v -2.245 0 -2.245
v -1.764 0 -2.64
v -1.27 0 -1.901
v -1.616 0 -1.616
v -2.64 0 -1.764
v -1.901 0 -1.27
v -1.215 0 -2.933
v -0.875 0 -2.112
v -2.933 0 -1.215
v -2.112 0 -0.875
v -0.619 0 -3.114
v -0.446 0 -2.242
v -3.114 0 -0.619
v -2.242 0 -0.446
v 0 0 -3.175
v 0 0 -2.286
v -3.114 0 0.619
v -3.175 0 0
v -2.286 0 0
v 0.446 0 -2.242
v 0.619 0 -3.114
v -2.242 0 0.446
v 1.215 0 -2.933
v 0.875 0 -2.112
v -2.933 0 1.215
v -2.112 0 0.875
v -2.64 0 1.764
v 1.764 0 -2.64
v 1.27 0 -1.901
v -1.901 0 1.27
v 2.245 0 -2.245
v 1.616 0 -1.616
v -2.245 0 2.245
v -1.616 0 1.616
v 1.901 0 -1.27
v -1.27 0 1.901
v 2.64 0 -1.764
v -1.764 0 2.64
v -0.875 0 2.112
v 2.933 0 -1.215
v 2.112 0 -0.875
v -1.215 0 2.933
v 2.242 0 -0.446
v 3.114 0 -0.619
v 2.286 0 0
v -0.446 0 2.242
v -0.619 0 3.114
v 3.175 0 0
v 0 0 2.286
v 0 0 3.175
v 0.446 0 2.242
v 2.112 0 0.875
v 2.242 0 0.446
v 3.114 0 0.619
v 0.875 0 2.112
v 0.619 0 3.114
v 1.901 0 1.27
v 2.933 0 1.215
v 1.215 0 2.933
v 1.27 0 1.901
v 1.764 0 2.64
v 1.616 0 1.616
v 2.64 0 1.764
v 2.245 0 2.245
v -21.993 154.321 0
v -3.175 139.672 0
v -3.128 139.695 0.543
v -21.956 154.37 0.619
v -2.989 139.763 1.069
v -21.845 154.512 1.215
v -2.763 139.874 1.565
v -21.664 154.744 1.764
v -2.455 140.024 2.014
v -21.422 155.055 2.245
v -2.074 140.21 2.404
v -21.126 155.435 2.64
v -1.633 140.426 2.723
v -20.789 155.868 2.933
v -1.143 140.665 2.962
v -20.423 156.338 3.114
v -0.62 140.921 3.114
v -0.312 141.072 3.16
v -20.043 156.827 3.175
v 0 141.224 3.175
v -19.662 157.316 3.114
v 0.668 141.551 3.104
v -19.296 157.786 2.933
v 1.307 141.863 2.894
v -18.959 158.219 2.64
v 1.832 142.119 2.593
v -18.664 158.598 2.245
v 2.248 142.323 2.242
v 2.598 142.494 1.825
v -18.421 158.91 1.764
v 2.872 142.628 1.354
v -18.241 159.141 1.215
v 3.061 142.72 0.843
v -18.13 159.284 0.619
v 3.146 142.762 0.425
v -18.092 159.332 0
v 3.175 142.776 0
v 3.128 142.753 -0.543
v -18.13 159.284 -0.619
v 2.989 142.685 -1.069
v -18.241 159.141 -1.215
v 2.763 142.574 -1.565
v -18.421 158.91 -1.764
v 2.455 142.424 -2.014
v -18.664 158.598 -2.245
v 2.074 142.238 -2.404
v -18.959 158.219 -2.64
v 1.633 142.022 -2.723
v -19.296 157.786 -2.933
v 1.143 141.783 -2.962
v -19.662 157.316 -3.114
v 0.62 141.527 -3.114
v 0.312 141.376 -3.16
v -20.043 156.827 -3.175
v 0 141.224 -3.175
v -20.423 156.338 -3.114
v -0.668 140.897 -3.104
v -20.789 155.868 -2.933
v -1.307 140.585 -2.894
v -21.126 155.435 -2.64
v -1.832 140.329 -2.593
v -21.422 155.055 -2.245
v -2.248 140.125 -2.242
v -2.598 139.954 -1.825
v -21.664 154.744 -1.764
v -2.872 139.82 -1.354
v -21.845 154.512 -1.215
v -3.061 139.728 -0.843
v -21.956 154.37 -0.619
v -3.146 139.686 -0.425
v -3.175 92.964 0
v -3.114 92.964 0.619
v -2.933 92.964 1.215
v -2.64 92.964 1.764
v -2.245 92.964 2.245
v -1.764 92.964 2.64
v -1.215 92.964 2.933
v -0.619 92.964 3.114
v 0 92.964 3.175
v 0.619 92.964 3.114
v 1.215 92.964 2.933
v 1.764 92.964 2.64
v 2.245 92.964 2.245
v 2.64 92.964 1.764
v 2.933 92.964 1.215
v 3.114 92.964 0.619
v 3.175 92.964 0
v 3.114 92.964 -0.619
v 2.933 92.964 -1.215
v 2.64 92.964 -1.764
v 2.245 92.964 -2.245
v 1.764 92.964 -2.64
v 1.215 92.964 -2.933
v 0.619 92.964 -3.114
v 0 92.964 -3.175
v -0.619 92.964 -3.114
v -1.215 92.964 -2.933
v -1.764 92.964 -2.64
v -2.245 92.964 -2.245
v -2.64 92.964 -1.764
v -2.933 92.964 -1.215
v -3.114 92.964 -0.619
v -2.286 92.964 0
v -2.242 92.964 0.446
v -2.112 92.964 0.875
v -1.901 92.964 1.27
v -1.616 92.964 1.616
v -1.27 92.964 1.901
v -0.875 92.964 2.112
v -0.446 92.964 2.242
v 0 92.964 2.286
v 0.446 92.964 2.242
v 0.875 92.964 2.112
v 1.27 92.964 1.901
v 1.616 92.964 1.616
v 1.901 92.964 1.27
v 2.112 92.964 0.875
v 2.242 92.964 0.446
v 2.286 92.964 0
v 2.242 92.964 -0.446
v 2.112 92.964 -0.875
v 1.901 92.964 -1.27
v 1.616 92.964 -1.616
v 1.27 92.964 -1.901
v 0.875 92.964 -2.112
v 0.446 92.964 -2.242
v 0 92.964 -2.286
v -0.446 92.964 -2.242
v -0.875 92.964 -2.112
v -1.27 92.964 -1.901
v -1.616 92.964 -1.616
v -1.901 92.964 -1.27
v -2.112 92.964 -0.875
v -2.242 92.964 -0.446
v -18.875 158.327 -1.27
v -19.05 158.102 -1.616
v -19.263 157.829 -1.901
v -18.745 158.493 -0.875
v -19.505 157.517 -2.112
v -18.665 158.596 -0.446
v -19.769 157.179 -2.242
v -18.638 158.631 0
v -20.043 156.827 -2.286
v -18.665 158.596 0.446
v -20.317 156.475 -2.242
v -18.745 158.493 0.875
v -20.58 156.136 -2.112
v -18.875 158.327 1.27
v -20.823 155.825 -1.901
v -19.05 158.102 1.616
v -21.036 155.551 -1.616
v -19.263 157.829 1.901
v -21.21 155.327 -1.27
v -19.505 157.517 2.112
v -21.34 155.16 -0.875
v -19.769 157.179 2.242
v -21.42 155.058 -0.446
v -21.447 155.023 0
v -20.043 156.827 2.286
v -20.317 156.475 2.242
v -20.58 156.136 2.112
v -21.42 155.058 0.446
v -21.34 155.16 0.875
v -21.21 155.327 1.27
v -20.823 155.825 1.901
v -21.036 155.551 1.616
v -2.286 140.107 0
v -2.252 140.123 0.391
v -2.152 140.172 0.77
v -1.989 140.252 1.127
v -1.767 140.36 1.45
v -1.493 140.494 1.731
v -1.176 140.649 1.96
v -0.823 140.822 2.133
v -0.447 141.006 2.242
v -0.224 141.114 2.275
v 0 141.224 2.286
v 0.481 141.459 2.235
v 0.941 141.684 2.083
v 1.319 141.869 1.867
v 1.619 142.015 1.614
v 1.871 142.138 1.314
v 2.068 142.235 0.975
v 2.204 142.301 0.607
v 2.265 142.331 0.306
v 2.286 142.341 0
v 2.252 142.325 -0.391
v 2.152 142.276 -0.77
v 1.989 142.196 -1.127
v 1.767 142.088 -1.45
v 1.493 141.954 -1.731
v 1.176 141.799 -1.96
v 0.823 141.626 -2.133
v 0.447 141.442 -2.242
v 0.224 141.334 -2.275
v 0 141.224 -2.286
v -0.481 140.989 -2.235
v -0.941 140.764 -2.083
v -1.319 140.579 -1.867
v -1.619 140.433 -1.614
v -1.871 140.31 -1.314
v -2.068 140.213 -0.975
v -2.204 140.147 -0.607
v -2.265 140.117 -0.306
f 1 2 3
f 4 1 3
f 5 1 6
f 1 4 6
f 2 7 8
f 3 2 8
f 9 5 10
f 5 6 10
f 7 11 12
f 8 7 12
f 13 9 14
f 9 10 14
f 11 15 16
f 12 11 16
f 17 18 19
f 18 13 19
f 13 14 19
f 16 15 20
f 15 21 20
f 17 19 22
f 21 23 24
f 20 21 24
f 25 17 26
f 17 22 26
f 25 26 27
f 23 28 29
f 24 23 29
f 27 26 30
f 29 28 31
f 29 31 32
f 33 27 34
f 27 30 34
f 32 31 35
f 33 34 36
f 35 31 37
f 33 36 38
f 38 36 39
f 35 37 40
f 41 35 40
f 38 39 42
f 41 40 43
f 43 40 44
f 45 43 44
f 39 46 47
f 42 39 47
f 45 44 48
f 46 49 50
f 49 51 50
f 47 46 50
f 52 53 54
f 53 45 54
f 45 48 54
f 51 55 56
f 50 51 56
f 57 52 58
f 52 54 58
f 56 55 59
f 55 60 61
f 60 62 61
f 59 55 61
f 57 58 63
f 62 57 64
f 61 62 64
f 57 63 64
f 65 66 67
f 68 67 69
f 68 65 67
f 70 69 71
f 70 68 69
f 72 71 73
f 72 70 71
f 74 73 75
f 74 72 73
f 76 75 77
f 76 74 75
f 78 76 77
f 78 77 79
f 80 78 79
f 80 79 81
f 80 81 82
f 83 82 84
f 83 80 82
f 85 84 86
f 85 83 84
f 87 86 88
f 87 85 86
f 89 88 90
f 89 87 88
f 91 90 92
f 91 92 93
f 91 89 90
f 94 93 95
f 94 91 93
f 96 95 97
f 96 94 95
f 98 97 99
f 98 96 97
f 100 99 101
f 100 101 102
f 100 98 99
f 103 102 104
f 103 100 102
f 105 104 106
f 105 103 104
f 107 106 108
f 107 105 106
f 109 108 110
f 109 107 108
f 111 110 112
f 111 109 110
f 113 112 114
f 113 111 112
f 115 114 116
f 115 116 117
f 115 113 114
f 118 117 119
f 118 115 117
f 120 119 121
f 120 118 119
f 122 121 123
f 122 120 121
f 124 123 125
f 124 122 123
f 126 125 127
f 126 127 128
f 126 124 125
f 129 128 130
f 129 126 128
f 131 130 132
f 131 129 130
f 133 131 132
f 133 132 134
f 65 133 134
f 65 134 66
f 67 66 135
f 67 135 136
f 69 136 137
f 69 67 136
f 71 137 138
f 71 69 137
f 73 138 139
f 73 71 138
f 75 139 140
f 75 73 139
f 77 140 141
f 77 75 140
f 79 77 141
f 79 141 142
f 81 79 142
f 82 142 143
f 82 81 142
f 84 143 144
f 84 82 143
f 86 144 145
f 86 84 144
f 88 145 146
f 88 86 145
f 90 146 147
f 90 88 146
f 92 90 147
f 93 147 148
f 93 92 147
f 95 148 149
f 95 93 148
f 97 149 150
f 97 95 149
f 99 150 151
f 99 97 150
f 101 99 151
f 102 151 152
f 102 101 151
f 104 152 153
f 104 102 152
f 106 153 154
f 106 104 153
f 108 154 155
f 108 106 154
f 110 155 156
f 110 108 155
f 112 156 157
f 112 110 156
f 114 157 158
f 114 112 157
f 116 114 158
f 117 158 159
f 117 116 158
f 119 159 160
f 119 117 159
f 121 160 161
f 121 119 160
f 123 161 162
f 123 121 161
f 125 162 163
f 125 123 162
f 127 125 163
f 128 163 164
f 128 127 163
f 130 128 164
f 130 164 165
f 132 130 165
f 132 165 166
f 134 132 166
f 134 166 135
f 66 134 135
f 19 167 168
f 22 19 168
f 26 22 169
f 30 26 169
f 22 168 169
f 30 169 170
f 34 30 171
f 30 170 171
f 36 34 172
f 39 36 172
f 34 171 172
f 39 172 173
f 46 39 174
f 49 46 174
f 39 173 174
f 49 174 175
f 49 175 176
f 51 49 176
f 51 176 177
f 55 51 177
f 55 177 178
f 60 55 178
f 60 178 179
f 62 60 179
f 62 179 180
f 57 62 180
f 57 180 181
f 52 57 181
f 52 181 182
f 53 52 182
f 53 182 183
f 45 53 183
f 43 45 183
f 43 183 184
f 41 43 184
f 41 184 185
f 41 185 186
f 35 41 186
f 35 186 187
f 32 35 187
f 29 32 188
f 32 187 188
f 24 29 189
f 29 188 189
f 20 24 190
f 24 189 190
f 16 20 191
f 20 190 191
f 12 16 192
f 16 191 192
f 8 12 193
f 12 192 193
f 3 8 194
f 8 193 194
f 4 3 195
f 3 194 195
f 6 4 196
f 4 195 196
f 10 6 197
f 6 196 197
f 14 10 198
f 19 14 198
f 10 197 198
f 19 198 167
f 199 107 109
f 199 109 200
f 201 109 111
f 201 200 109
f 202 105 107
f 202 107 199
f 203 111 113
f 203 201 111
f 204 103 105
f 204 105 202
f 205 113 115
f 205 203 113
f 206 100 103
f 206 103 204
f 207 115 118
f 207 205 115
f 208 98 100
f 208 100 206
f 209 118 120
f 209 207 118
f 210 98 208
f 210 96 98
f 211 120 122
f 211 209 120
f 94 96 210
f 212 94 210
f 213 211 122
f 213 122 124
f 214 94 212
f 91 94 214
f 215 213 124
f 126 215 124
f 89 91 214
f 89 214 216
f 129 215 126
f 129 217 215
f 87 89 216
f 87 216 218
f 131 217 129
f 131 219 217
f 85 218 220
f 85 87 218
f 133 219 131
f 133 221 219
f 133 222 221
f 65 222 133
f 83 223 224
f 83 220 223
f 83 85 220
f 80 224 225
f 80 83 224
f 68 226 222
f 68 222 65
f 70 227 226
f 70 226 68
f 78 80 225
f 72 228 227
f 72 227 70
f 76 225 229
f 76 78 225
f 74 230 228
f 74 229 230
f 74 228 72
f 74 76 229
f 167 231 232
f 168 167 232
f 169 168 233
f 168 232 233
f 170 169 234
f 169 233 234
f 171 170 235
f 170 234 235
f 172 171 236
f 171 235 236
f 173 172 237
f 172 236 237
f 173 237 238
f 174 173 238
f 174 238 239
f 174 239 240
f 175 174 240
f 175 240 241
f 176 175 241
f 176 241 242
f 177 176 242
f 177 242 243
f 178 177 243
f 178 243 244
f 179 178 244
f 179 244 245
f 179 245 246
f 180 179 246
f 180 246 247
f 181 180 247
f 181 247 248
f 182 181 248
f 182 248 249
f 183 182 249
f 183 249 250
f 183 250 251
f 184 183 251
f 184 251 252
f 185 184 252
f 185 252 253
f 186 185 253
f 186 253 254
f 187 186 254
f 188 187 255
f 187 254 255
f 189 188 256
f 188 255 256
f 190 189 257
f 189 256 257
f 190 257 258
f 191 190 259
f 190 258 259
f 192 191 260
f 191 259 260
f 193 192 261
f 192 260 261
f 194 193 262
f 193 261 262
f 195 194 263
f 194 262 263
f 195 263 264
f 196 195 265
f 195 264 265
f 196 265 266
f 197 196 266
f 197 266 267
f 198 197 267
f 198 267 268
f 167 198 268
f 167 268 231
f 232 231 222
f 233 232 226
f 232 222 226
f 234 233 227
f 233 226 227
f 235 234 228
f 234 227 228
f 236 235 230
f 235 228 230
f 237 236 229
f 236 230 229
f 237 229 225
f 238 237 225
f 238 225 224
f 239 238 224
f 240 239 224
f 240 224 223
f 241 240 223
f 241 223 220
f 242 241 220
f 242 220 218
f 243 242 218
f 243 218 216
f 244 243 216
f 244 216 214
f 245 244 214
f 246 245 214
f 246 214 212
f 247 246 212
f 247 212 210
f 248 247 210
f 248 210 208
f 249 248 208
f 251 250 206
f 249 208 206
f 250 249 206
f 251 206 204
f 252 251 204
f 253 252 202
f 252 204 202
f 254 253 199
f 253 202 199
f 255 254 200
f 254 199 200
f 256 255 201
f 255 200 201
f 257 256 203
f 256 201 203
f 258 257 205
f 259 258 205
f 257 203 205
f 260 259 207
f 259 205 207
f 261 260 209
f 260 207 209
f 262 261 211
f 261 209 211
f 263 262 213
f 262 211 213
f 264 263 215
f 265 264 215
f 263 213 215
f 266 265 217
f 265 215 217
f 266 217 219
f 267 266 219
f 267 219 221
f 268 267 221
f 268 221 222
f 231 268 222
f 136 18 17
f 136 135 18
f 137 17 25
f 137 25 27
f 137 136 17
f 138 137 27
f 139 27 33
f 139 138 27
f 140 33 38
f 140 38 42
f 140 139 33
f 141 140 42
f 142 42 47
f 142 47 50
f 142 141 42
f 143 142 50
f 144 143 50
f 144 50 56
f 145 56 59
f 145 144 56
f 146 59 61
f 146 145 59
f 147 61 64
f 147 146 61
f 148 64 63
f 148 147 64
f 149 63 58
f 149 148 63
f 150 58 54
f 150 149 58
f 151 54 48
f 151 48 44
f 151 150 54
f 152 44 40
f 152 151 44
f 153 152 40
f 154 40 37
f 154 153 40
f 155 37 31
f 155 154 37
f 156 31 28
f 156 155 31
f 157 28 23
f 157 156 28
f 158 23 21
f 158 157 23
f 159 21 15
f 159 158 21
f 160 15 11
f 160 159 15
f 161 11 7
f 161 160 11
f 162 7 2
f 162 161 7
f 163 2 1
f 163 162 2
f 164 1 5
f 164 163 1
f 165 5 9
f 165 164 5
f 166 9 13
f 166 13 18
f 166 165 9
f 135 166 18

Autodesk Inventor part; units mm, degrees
ref_plane "YZ Plane" through (0, 0, 0) normal (1, 0, 0) x (0, 1, 0)
ref_plane "XZ Plane" through (0, 0, 0) normal (0, 1, 0) x (-1, 0, 0)
ref_plane "XY Plane" through (0, 0, 0) normal (0, 0, 1) x (1, 0, 0)
sketch "Sketch1" plane through (0, 0, 0) normal (0, 1, 0) x (-1, 0, 0)
  circle A0 centre (0, 0) radius 2.286
  circle A1 centre (0, 0) radius 3.175
  dimension "d0" = 4.572
  dimension "d1" = 6.35
sketch "Sketch2" plane through (0, 0, 0) normal (0, 0, 1) x (1, 0, 0)
  line L0 (0, 0) -> (0, 92.964)
  line L1 (0, 0) -> (92.964, 0) construction
  line L2 (0, 92.964) -> (0, 141.224)
  line L3 (0, 141.224) -> (-20.0427, 156.8268)
  line L4 (0, 141.224) -> (25.4, 141.224) construction
  dimension "d2" = 92.964
  dimension "d3" = 90
  dimension "d4" = 48.26
  dimension "d5" = 25.4
  dimension "d6" = 142.1
sweep "Sweep1" add profiles "Sketch1" path "Sketch2"
properties part number "feedthroughpipe"
